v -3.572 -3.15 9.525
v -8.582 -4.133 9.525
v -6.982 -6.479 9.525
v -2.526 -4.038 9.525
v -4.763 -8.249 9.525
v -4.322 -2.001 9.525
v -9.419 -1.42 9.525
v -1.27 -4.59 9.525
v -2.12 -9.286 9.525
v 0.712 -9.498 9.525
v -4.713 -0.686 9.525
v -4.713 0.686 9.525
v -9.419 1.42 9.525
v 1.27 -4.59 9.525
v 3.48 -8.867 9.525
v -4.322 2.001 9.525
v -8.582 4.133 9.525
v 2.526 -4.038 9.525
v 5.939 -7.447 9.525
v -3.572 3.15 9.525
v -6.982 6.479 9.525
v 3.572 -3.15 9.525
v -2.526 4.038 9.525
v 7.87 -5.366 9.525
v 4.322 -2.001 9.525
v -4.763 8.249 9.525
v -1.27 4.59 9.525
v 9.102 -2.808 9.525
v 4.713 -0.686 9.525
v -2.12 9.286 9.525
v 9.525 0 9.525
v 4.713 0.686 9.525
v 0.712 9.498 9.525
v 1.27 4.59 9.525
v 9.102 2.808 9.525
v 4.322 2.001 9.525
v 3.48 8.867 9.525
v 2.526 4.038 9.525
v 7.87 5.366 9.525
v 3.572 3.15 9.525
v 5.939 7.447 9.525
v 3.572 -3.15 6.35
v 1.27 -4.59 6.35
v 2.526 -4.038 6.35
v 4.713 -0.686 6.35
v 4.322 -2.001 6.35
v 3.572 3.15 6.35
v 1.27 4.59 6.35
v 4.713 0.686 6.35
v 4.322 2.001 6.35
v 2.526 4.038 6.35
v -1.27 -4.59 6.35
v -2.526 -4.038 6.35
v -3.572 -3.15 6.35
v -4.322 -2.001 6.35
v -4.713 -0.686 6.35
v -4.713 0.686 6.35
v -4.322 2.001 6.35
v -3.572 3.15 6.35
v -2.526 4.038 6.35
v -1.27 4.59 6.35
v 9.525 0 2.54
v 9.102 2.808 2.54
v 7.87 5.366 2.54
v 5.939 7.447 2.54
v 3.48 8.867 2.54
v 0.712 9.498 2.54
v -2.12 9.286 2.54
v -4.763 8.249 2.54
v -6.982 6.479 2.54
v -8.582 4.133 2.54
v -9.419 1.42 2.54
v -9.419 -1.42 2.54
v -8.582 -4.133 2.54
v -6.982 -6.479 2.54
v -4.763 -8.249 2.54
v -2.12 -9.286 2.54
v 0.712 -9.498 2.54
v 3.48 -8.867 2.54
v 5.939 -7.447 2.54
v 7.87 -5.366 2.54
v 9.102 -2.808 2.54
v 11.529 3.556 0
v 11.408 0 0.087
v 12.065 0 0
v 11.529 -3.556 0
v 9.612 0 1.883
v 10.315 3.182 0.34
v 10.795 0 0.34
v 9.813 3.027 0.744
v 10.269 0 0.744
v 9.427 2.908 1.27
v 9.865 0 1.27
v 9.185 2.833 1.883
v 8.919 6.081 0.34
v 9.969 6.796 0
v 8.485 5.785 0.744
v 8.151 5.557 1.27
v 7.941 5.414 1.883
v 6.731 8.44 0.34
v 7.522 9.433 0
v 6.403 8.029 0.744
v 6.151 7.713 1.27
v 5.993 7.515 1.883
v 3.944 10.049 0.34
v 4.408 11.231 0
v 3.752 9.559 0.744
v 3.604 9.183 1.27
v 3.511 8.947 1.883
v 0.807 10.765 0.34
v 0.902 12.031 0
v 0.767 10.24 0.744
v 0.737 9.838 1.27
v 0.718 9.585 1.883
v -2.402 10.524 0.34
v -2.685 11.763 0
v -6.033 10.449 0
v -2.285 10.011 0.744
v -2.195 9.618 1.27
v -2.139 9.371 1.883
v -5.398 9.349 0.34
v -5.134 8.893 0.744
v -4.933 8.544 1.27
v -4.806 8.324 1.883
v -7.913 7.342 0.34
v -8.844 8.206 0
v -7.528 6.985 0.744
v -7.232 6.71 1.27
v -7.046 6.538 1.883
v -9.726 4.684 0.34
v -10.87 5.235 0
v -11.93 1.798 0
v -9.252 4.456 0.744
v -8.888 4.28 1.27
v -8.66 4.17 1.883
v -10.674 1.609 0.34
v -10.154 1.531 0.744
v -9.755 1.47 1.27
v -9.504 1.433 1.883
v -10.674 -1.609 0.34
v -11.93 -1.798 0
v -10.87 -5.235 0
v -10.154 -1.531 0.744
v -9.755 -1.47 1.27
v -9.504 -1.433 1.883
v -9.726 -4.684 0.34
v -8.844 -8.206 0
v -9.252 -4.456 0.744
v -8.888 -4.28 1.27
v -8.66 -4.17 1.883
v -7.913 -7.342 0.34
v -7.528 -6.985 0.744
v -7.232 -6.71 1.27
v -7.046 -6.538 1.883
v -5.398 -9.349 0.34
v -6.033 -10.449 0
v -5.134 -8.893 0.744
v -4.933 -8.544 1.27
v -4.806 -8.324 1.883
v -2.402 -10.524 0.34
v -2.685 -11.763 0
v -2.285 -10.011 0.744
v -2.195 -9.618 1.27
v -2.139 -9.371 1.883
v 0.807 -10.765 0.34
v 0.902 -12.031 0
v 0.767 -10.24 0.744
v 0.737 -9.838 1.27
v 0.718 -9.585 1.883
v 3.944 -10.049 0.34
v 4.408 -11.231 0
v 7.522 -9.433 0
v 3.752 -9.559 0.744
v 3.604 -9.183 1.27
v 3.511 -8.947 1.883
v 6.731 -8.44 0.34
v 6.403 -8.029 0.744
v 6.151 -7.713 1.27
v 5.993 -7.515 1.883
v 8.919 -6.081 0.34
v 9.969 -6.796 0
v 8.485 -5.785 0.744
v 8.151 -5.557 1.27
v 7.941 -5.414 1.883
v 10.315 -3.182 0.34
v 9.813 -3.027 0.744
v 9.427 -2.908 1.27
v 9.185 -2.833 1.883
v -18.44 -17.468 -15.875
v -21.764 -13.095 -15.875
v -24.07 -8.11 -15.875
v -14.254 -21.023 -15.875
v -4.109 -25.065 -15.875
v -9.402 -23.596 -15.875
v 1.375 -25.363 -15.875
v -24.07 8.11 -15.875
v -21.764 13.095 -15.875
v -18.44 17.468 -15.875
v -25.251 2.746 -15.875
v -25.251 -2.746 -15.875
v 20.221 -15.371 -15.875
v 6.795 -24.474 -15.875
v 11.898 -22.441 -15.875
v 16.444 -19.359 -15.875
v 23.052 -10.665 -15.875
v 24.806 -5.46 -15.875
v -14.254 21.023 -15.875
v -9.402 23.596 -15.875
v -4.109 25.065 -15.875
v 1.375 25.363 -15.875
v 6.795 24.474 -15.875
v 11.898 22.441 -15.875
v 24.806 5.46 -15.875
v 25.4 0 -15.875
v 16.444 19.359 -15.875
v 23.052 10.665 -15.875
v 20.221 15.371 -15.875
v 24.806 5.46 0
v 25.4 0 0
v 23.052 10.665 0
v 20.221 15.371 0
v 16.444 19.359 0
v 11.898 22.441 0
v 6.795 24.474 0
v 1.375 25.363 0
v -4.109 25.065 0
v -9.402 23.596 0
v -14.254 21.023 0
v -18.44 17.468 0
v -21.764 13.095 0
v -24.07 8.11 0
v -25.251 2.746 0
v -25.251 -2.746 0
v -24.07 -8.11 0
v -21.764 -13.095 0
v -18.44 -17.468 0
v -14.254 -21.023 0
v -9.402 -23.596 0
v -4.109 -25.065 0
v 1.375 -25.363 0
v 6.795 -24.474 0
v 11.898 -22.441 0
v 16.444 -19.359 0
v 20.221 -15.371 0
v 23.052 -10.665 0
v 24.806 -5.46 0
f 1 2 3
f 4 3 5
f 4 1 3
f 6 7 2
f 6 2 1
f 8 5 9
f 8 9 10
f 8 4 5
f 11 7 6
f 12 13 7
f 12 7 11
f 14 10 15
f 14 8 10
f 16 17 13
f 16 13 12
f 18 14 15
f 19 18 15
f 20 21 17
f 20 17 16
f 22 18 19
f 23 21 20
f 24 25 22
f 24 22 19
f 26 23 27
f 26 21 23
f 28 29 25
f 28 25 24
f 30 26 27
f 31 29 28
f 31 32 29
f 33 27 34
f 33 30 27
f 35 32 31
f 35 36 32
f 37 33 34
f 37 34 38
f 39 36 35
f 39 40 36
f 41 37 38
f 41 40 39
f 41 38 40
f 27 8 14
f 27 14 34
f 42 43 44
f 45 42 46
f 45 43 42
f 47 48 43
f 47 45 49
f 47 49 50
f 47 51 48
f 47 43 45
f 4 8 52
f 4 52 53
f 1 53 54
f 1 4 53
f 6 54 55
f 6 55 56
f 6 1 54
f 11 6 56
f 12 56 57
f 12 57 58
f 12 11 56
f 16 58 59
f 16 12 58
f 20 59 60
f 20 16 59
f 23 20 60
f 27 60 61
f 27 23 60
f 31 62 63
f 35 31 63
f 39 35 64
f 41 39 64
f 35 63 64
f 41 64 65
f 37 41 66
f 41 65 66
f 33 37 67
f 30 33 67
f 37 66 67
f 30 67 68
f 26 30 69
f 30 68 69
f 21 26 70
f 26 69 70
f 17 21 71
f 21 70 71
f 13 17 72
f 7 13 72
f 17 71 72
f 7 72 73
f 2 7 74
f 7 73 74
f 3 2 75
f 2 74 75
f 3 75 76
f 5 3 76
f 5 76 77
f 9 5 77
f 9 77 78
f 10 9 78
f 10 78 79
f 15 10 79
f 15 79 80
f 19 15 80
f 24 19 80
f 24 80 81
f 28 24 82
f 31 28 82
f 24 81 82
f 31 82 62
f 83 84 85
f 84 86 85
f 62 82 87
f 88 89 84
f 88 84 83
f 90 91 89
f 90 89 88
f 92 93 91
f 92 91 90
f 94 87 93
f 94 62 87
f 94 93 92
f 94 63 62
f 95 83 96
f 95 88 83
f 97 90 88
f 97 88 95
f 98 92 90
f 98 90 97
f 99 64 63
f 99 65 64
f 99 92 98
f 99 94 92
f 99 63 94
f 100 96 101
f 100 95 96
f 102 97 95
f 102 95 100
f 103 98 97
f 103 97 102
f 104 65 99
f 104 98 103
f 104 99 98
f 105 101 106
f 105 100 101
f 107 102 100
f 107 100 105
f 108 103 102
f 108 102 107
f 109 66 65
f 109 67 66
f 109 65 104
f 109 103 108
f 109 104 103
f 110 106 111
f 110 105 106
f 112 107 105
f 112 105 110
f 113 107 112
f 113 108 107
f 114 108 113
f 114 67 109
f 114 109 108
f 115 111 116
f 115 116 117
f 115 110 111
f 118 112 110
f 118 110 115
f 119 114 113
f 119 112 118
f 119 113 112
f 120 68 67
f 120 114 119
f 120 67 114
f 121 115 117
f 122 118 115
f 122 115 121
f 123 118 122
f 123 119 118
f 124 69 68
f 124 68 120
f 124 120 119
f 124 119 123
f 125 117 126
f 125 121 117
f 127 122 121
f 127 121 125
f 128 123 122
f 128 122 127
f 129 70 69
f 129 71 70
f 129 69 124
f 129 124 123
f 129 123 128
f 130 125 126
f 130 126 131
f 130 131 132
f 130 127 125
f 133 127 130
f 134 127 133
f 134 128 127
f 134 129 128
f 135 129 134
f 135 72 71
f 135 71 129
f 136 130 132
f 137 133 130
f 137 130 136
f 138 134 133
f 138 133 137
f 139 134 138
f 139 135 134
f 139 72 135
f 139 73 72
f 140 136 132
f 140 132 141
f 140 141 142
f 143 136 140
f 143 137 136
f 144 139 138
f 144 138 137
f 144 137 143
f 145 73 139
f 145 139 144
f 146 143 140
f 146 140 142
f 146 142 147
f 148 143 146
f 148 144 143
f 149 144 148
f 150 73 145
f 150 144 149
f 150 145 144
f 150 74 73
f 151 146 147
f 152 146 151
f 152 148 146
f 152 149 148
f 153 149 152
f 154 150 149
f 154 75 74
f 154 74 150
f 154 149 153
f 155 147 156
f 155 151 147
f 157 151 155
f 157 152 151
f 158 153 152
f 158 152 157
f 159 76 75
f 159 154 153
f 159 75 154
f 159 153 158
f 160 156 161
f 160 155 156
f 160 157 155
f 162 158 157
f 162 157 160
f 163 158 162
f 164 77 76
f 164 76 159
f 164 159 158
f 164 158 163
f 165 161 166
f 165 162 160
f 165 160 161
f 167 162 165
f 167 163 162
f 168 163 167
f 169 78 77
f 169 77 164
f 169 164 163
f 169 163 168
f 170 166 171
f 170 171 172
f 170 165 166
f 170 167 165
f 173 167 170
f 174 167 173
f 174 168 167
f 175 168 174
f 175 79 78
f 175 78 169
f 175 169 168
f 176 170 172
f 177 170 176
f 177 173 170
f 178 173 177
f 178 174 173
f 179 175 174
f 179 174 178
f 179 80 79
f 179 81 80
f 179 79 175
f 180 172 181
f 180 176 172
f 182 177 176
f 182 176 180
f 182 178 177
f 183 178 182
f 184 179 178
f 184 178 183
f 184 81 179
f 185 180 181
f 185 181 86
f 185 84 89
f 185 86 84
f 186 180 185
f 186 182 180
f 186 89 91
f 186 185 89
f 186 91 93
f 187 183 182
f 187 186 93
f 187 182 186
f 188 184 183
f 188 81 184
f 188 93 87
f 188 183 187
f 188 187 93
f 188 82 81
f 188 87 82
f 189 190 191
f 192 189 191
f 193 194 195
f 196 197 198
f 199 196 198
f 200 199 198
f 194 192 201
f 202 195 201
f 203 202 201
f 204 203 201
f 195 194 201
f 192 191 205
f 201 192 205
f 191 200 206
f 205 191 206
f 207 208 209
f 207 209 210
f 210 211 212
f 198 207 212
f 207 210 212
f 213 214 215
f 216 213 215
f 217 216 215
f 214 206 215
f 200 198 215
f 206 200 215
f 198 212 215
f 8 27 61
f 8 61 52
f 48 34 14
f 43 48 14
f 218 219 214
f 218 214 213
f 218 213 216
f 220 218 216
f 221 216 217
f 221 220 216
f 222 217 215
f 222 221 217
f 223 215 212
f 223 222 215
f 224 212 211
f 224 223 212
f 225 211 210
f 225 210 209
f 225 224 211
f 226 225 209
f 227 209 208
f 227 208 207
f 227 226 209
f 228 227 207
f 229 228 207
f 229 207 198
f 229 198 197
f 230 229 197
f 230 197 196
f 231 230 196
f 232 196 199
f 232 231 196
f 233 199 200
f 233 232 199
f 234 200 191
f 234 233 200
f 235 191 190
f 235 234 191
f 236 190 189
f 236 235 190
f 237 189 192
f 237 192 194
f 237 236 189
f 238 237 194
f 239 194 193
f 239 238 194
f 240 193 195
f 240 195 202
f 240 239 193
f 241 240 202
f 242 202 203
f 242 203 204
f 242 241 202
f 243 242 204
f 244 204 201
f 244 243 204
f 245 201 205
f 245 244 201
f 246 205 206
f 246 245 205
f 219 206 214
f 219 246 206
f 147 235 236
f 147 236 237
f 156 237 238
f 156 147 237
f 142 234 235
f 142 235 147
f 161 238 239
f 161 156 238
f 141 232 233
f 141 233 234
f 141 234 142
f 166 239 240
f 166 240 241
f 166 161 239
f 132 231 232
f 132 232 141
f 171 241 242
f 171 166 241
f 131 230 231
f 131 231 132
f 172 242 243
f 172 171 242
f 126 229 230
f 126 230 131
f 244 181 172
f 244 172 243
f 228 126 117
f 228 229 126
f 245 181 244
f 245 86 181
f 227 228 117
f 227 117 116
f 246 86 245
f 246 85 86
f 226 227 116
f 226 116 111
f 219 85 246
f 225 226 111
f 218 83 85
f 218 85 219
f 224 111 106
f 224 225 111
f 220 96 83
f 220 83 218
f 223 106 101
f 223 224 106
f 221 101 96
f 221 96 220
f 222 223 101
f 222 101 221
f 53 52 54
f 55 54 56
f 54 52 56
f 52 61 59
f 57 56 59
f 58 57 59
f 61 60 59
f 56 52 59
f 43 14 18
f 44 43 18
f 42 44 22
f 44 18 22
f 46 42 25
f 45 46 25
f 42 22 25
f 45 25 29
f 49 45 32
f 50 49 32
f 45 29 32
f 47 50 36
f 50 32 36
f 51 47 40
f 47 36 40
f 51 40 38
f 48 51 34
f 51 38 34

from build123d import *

# Parameters (mm, degrees)
SKETCH1_R           = 25.4
BOSS_EXTRUDE1_DEPTH = 15.875
SKETCH2_R           = 9.525
BOSS_EXTRUDE2_DEPTH = 9.525
FILLET2_R           = 2.54
CUT_EXTRUDE1_DEPTH  = 3.175


with BuildPart() as part:
    # Sketch1 → Boss-Extrude1 (new body)
    with BuildSketch(Plane.XY):
        Circle(SKETCH1_R)
    extrude(amount=-BOSS_EXTRUDE1_DEPTH)

    # Sketch2 → Boss-Extrude2 (add)
    with BuildSketch(Plane.XY):
        Circle(SKETCH2_R)
    extrude(amount=BOSS_EXTRUDE2_DEPTH)

    # Fillet2
    fillet2_edges = [part.edges().sort_by_distance(p)[0] for p in [
        (-9.525, 0, 0),
    ]]
    fillet(fillet2_edges, radius=FILLET2_R)

    # Sketch3 → Cut-Extrude1 (cut)
    with BuildSketch(Plane.XY.offset(9.525)):
        with BuildLine():
            Line((-1.27, 4.590044254), (-1.27, -4.590044254))
            ThreePointArc((-1.27, -4.590044254), (-4.7625, 0), (-1.27, 4.590044254))
        make_face()
        with BuildLine():
            Line((1.27, 4.590044254), (1.27, -4.590044254))
            ThreePointArc((1.27, -4.590044254), (4.7625, 0), (1.27, 4.590044254))
        make_face()
    extrude(amount=-CUT_EXTRUDE1_DEPTH, mode=Mode.SUBTRACT)


solid = part.part
